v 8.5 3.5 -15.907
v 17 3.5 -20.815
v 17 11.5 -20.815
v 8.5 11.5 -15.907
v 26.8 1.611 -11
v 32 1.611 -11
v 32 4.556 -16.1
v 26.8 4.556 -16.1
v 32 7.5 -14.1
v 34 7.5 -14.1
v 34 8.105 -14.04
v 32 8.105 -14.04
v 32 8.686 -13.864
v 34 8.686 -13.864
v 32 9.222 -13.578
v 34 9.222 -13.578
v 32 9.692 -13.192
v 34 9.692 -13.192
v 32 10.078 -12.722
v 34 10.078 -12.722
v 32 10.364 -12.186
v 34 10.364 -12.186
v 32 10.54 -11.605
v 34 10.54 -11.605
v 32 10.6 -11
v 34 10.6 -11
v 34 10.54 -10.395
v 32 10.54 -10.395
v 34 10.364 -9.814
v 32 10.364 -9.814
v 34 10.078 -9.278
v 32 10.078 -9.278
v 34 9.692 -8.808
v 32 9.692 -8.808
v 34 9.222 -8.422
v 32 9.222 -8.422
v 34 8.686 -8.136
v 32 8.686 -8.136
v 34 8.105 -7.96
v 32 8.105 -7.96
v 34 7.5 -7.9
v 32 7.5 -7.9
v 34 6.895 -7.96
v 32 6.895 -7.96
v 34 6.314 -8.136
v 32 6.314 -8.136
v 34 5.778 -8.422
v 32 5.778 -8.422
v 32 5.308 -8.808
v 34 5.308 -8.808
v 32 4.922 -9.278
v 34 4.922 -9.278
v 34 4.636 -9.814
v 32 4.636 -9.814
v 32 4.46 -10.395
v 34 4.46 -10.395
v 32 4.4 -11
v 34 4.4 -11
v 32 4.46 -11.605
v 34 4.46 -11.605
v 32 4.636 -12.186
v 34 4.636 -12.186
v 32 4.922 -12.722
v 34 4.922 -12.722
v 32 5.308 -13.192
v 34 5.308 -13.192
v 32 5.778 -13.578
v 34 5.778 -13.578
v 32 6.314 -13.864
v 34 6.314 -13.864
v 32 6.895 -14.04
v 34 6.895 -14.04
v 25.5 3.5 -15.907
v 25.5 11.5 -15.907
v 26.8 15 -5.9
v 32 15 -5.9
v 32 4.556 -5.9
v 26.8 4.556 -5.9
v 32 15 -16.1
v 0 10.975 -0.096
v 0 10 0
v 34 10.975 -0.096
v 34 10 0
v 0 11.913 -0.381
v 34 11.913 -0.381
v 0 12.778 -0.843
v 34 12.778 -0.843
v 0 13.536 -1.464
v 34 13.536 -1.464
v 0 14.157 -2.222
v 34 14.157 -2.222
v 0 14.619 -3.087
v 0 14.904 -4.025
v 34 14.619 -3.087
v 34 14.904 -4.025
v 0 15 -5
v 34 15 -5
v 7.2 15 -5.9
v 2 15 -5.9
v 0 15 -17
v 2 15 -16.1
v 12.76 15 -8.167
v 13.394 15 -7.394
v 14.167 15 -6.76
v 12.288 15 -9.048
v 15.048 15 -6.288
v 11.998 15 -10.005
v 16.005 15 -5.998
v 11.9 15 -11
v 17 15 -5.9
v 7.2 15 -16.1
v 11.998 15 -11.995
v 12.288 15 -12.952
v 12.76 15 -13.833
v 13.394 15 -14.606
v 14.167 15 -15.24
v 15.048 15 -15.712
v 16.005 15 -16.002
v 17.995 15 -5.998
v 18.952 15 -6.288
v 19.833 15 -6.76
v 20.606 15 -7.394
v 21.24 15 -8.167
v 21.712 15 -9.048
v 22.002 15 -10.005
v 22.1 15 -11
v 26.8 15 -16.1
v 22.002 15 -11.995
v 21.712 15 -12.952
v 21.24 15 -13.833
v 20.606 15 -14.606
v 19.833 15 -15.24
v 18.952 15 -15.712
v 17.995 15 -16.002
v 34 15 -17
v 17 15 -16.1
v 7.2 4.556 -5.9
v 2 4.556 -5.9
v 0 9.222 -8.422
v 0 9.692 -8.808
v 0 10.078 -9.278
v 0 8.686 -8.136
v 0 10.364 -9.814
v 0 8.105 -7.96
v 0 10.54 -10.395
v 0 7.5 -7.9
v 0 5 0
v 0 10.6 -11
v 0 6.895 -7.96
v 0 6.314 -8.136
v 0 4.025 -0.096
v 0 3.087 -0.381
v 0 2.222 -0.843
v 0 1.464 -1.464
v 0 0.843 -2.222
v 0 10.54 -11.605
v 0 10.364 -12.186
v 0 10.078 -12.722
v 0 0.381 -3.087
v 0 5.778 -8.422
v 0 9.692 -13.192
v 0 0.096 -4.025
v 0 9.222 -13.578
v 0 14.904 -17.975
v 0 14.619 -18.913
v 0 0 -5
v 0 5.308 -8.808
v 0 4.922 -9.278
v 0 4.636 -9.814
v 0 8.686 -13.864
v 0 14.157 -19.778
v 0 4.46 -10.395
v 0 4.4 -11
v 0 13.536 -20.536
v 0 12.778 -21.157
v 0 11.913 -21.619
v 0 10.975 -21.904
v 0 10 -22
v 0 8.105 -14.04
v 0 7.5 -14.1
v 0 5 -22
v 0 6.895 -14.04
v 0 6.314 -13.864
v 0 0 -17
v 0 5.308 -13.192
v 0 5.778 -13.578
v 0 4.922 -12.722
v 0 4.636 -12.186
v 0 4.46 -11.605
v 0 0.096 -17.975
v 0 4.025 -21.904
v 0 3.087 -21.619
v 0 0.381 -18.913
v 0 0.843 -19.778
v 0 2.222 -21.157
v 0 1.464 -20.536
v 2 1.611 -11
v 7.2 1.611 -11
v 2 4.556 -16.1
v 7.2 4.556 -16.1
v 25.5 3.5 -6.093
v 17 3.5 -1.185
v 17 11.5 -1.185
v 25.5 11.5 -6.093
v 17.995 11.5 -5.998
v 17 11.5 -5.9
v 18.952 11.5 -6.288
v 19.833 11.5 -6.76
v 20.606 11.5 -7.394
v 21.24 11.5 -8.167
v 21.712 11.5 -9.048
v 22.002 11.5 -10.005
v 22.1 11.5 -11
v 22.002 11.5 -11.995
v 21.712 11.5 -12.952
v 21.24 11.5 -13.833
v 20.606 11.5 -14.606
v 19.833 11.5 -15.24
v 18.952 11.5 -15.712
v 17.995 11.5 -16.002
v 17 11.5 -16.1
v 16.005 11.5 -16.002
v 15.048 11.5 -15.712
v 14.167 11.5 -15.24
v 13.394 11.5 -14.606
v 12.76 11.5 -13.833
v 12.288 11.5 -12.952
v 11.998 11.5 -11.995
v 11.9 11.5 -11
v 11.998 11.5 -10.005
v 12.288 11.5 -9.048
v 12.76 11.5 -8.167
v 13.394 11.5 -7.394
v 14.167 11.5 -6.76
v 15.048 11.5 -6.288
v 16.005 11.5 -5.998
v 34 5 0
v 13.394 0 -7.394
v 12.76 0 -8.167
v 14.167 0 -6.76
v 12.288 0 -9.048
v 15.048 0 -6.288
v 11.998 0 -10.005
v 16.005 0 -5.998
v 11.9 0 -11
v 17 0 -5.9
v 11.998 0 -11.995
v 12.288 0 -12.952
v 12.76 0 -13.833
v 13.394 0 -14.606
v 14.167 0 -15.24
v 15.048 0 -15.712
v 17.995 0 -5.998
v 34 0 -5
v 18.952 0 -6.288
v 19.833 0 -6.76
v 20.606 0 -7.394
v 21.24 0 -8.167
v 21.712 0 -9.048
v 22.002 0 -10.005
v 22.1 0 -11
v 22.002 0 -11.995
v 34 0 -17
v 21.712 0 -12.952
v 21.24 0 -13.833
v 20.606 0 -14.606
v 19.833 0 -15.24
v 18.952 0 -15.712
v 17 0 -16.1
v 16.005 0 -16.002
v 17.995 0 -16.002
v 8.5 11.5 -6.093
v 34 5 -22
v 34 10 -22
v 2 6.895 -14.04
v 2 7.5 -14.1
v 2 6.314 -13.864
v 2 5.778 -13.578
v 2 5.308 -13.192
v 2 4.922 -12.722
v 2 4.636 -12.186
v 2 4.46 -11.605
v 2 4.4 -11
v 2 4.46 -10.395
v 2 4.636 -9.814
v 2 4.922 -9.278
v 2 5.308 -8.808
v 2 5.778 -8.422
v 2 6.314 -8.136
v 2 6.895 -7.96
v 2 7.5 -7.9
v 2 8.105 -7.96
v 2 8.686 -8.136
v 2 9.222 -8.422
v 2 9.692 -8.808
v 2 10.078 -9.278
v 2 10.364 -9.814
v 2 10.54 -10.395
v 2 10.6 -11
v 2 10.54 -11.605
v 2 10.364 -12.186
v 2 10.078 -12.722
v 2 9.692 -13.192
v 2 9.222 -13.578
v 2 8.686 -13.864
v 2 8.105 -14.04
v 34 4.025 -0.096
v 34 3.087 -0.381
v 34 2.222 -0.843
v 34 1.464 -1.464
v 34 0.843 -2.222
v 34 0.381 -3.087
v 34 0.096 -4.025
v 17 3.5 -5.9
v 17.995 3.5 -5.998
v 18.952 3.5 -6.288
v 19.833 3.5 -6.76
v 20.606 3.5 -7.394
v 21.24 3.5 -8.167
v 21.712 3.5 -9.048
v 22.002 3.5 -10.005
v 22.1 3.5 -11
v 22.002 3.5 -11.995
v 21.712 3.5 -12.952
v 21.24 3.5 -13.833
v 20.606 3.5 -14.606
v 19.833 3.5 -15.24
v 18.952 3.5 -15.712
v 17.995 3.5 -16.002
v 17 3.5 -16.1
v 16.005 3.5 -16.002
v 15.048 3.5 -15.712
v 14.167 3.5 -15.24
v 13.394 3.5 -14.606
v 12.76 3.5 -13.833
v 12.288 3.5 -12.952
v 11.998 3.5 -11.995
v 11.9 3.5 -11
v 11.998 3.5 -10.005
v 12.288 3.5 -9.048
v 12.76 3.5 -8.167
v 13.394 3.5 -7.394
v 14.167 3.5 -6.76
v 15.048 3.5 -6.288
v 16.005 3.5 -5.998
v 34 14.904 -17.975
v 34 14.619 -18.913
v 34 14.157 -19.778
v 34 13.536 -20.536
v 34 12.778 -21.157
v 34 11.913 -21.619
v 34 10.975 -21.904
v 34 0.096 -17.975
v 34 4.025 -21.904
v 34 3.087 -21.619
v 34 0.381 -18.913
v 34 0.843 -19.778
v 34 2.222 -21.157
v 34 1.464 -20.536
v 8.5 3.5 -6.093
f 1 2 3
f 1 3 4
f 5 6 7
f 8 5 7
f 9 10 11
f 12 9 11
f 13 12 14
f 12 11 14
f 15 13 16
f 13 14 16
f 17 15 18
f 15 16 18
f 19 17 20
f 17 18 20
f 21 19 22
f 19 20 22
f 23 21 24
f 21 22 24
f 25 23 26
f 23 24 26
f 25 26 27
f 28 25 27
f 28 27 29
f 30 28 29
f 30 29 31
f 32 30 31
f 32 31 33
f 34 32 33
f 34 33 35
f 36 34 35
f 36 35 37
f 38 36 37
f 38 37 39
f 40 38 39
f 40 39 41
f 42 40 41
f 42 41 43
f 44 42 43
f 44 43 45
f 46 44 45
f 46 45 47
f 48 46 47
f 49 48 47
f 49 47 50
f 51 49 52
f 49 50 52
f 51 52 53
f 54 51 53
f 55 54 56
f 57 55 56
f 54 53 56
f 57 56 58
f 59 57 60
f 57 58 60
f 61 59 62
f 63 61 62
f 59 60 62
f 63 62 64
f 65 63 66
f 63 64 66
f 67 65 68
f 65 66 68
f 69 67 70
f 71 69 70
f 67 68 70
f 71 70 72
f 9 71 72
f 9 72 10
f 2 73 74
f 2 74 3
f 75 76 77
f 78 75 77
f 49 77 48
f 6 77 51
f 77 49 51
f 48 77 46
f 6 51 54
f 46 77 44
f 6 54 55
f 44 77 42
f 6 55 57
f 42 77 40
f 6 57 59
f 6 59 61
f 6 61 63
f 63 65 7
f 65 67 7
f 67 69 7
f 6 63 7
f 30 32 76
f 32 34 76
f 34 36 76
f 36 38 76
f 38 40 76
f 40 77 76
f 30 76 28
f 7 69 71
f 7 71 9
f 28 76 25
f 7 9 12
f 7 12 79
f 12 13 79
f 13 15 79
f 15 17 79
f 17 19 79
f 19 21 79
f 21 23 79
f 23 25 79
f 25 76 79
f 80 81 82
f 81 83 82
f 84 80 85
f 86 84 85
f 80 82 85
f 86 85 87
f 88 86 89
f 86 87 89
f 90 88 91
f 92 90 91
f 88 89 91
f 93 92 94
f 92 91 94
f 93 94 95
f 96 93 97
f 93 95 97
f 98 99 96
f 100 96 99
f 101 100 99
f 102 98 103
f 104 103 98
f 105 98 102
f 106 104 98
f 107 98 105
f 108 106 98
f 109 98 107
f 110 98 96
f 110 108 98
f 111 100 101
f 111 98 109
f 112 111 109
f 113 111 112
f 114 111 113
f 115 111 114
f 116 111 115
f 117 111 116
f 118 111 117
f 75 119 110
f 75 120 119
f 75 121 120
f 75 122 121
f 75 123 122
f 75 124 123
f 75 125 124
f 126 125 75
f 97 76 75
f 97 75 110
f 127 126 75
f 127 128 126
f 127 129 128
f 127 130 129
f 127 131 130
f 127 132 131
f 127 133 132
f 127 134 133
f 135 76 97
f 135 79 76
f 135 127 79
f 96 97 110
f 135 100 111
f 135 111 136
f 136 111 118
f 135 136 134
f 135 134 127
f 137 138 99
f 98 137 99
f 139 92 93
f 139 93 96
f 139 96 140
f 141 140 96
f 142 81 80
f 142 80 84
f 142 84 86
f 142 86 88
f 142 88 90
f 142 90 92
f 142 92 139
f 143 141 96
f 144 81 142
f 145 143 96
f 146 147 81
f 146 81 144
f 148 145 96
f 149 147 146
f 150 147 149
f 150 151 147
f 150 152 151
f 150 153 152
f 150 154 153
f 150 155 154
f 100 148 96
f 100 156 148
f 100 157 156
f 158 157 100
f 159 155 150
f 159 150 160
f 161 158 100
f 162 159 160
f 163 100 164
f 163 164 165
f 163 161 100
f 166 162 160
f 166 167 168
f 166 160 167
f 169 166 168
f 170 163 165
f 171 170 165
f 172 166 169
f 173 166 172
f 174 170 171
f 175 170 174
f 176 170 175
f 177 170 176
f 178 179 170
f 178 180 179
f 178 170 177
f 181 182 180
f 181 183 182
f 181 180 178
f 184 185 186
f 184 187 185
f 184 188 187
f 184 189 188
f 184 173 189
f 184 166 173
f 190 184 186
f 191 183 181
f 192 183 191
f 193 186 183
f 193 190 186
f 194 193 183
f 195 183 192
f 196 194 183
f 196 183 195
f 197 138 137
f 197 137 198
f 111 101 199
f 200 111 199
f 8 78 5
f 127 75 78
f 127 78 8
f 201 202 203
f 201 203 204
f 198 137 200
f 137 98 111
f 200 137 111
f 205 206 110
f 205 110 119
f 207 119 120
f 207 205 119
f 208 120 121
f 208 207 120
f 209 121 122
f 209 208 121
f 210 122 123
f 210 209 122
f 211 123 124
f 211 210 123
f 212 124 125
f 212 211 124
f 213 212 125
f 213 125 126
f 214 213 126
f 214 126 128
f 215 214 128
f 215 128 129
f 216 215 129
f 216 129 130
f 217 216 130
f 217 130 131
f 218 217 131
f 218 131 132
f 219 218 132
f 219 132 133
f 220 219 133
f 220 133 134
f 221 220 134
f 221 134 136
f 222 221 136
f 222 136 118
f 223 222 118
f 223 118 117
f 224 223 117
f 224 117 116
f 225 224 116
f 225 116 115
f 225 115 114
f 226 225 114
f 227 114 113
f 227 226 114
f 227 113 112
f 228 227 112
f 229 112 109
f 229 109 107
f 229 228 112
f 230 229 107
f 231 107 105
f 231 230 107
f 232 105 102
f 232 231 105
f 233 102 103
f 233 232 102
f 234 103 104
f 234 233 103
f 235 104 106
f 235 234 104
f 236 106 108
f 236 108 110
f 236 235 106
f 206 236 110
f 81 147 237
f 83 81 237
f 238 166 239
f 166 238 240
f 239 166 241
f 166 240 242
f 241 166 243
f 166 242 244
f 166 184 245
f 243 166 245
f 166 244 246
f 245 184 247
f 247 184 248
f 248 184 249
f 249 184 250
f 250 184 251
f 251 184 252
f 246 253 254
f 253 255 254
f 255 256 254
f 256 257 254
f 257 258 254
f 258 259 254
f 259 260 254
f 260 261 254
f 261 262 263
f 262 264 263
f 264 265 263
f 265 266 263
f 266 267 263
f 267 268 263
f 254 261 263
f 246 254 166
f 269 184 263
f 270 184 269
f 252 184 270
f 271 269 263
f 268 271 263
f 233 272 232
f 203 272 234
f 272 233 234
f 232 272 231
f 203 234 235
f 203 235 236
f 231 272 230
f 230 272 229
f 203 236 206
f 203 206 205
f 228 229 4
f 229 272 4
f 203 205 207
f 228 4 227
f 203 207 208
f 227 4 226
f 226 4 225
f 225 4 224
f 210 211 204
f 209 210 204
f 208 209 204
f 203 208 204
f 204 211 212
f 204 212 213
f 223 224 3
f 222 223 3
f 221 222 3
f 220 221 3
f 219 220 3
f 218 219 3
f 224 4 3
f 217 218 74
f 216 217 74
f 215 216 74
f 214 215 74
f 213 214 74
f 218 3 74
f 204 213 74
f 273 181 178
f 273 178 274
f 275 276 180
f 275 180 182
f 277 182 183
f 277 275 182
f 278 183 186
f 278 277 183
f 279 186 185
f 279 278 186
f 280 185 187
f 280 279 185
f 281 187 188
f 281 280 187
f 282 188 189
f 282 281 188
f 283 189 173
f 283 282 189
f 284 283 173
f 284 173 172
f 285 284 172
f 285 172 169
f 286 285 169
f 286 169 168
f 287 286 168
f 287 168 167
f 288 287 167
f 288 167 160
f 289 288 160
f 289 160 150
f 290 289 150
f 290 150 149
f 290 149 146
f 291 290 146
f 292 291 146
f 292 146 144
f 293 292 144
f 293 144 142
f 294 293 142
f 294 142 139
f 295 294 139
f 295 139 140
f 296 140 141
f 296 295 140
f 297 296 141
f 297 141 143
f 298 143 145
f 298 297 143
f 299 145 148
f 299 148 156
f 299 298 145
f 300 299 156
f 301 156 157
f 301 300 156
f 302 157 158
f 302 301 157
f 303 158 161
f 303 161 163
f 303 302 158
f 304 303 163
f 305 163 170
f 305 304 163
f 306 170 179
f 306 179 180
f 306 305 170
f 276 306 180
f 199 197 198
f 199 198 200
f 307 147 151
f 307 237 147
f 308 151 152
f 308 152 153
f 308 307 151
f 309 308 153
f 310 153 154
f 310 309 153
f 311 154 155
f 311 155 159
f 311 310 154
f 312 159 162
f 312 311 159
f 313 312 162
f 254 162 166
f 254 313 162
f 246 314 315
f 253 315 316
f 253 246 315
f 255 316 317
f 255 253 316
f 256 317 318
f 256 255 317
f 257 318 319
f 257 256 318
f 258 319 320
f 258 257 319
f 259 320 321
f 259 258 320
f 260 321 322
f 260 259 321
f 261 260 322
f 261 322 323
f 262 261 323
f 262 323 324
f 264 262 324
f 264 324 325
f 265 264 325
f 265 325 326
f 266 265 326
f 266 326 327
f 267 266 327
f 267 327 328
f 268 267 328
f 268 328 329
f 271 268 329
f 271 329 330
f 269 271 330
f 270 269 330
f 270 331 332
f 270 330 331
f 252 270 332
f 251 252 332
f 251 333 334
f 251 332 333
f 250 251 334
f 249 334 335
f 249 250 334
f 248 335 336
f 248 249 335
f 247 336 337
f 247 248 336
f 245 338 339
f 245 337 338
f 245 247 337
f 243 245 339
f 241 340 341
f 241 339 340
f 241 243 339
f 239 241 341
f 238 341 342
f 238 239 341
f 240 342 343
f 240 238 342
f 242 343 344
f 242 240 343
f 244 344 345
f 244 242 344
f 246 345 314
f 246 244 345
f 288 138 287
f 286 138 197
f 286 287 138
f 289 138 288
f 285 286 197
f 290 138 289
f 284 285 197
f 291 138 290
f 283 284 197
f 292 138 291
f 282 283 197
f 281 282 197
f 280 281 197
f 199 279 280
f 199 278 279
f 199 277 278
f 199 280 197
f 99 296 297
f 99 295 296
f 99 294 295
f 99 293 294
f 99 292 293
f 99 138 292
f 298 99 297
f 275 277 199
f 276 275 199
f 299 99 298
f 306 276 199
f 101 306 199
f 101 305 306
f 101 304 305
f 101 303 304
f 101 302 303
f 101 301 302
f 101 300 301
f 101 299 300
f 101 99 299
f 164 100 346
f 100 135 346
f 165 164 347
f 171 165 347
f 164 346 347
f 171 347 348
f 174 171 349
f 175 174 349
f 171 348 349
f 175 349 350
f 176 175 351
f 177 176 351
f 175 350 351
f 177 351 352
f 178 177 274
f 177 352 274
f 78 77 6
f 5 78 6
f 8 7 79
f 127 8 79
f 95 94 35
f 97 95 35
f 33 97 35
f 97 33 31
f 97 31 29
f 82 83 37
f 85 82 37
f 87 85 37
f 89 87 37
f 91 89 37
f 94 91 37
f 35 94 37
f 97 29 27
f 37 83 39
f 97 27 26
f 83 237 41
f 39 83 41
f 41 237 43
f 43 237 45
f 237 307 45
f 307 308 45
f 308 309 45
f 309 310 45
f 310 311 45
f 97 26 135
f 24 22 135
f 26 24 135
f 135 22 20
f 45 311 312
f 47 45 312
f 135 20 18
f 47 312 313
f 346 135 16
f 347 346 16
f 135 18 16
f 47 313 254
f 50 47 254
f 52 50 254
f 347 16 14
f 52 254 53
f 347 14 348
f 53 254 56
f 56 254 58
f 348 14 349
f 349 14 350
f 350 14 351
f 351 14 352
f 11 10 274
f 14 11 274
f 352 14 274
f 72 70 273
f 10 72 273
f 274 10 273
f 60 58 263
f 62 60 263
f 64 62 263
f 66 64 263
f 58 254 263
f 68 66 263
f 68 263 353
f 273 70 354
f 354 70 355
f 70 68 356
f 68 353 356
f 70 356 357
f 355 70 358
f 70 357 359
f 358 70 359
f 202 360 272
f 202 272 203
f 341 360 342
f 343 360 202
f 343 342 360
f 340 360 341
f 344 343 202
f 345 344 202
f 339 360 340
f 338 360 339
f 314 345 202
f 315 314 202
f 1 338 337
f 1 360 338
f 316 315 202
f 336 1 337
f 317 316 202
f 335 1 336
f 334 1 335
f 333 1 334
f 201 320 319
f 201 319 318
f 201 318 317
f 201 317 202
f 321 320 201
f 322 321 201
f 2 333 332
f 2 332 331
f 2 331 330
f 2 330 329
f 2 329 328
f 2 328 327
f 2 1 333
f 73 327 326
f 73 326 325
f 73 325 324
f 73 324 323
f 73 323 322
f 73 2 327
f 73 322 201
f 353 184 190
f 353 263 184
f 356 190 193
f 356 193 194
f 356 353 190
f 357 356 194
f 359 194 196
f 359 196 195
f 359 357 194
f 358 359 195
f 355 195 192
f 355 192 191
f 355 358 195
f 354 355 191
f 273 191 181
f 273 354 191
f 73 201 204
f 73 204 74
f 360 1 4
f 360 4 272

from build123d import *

# Parameters (mm, degrees)
CROQUIS1_W                 = 34
CROQUIS1_H                 = 22
CROQUIS1_R                 = 5.1
SALIENTE_EXTRUIR1_DEPTH    = 15
CORTAR_EXTRUIR1_DEPTH      = 5.2
CORTAR_EXTRUIR2_DEPTH      = 5.2
CORTAR_EXTRUIR3_DEPTH      = 4
CORTAR_EXTRUIR3_DEPTH_BACK = 4
CROQUIS5_R                 = 3.1
CORTAR_EXTRUIR4_DEPTH      = 4
CORTAR_EXTRUIR5_START      = -4
CROQUIS6_R                 = 3.1
CORTAR_EXTRUIR5_DEPTH      = 4
REDONDEO1_R                = 5


with BuildPart() as part:
    # Croquis1 → Saliente-Extruir1 (new body)
    with BuildSketch(Plane(origin=(0, 0, 0), x_dir=(1, 0, 0), z_dir=(0, 1, 0))):
        with Locations((17, 11)):
            Rectangle(CROQUIS1_W, CROQUIS1_H)
        with Locations(Location((17, 11, 0), (0, 0, 270))):
            Circle(CROQUIS1_R, mode=Mode.SUBTRACT)
    extrude(amount=SALIENTE_EXTRUIR1_DEPTH)

    # Croquis2 → Cortar-Extruir1 (cut)
    with BuildSketch(Plane.ZY.offset(-2)):
        Polygon((-16.1, 10.444486373), (-16.1, 15), (-5.9, 15), (-5.9, 10.444486373), (-5.9, 4.555513627), (-11, 1.611027254), (-16.1, 4.555513627), align=None)
    extrude(amount=-CORTAR_EXTRUIR1_DEPTH, mode=Mode.SUBTRACT)

    # Croquis3 → Cortar-Extruir2 (cut)
    with BuildSketch(Plane(origin=(32, 0, 0), x_dir=(0, 0, -1), z_dir=(1, 0, 0))):
        Polygon((5.9, 15), (5.9, 4.555513627), (11, 1.611027254), (16.1, 4.555513627), (16.1, 15), align=None)
    extrude(amount=-CORTAR_EXTRUIR2_DEPTH, mode=Mode.SUBTRACT)

    # Croquis4 → Cortar-Extruir3 (cut, two sides: drawn at the far end of the back side and taken through both)
    with BuildSketch(Plane(origin=(0, 7.5, 0), x_dir=(1, 0, 0), z_dir=(0, 1, 0)).offset(-CORTAR_EXTRUIR3_DEPTH_BACK)):
        Polygon((8.5, 6.092522712), (17, 1.185045424), (25.5, 6.092522712), (25.5, 15.907477288), (17, 20.814954576), (8.5, 15.907477288), align=None)
    extrude(amount=CORTAR_EXTRUIR3_DEPTH + CORTAR_EXTRUIR3_DEPTH_BACK, mode=Mode.SUBTRACT)

    # Croquis5 → Cortar-Extruir4 (cut)
    with BuildSketch(Plane(origin=(34, 0, 0), x_dir=(0, 0, -1), z_dir=(1, 0, 0))):
        with Locations((11, 7.5)):
            Circle(CROQUIS5_R)
    extrude(amount=-CORTAR_EXTRUIR4_DEPTH, mode=Mode.SUBTRACT)

    # Croquis6 → Cortar-Extruir5 (cut)
    with BuildSketch(Plane.ZY.offset(CORTAR_EXTRUIR5_START)):
        with Locations(Location((-11, 7.5, 0), (0, 0, 180))):
            Circle(CROQUIS6_R)
    extrude(amount=CORTAR_EXTRUIR5_DEPTH, mode=Mode.SUBTRACT)

    # Redondeo1
    redondeo1_edges = [part.edges().sort_by_distance(p)[0] for p in [
        (17, 15, -22),
        (17, 0, -22),
        (17, 0, 0),
        (17, 15, 0),
    ]]
    fillet(redondeo1_edges, radius=REDONDEO1_R)


solid = part.part
